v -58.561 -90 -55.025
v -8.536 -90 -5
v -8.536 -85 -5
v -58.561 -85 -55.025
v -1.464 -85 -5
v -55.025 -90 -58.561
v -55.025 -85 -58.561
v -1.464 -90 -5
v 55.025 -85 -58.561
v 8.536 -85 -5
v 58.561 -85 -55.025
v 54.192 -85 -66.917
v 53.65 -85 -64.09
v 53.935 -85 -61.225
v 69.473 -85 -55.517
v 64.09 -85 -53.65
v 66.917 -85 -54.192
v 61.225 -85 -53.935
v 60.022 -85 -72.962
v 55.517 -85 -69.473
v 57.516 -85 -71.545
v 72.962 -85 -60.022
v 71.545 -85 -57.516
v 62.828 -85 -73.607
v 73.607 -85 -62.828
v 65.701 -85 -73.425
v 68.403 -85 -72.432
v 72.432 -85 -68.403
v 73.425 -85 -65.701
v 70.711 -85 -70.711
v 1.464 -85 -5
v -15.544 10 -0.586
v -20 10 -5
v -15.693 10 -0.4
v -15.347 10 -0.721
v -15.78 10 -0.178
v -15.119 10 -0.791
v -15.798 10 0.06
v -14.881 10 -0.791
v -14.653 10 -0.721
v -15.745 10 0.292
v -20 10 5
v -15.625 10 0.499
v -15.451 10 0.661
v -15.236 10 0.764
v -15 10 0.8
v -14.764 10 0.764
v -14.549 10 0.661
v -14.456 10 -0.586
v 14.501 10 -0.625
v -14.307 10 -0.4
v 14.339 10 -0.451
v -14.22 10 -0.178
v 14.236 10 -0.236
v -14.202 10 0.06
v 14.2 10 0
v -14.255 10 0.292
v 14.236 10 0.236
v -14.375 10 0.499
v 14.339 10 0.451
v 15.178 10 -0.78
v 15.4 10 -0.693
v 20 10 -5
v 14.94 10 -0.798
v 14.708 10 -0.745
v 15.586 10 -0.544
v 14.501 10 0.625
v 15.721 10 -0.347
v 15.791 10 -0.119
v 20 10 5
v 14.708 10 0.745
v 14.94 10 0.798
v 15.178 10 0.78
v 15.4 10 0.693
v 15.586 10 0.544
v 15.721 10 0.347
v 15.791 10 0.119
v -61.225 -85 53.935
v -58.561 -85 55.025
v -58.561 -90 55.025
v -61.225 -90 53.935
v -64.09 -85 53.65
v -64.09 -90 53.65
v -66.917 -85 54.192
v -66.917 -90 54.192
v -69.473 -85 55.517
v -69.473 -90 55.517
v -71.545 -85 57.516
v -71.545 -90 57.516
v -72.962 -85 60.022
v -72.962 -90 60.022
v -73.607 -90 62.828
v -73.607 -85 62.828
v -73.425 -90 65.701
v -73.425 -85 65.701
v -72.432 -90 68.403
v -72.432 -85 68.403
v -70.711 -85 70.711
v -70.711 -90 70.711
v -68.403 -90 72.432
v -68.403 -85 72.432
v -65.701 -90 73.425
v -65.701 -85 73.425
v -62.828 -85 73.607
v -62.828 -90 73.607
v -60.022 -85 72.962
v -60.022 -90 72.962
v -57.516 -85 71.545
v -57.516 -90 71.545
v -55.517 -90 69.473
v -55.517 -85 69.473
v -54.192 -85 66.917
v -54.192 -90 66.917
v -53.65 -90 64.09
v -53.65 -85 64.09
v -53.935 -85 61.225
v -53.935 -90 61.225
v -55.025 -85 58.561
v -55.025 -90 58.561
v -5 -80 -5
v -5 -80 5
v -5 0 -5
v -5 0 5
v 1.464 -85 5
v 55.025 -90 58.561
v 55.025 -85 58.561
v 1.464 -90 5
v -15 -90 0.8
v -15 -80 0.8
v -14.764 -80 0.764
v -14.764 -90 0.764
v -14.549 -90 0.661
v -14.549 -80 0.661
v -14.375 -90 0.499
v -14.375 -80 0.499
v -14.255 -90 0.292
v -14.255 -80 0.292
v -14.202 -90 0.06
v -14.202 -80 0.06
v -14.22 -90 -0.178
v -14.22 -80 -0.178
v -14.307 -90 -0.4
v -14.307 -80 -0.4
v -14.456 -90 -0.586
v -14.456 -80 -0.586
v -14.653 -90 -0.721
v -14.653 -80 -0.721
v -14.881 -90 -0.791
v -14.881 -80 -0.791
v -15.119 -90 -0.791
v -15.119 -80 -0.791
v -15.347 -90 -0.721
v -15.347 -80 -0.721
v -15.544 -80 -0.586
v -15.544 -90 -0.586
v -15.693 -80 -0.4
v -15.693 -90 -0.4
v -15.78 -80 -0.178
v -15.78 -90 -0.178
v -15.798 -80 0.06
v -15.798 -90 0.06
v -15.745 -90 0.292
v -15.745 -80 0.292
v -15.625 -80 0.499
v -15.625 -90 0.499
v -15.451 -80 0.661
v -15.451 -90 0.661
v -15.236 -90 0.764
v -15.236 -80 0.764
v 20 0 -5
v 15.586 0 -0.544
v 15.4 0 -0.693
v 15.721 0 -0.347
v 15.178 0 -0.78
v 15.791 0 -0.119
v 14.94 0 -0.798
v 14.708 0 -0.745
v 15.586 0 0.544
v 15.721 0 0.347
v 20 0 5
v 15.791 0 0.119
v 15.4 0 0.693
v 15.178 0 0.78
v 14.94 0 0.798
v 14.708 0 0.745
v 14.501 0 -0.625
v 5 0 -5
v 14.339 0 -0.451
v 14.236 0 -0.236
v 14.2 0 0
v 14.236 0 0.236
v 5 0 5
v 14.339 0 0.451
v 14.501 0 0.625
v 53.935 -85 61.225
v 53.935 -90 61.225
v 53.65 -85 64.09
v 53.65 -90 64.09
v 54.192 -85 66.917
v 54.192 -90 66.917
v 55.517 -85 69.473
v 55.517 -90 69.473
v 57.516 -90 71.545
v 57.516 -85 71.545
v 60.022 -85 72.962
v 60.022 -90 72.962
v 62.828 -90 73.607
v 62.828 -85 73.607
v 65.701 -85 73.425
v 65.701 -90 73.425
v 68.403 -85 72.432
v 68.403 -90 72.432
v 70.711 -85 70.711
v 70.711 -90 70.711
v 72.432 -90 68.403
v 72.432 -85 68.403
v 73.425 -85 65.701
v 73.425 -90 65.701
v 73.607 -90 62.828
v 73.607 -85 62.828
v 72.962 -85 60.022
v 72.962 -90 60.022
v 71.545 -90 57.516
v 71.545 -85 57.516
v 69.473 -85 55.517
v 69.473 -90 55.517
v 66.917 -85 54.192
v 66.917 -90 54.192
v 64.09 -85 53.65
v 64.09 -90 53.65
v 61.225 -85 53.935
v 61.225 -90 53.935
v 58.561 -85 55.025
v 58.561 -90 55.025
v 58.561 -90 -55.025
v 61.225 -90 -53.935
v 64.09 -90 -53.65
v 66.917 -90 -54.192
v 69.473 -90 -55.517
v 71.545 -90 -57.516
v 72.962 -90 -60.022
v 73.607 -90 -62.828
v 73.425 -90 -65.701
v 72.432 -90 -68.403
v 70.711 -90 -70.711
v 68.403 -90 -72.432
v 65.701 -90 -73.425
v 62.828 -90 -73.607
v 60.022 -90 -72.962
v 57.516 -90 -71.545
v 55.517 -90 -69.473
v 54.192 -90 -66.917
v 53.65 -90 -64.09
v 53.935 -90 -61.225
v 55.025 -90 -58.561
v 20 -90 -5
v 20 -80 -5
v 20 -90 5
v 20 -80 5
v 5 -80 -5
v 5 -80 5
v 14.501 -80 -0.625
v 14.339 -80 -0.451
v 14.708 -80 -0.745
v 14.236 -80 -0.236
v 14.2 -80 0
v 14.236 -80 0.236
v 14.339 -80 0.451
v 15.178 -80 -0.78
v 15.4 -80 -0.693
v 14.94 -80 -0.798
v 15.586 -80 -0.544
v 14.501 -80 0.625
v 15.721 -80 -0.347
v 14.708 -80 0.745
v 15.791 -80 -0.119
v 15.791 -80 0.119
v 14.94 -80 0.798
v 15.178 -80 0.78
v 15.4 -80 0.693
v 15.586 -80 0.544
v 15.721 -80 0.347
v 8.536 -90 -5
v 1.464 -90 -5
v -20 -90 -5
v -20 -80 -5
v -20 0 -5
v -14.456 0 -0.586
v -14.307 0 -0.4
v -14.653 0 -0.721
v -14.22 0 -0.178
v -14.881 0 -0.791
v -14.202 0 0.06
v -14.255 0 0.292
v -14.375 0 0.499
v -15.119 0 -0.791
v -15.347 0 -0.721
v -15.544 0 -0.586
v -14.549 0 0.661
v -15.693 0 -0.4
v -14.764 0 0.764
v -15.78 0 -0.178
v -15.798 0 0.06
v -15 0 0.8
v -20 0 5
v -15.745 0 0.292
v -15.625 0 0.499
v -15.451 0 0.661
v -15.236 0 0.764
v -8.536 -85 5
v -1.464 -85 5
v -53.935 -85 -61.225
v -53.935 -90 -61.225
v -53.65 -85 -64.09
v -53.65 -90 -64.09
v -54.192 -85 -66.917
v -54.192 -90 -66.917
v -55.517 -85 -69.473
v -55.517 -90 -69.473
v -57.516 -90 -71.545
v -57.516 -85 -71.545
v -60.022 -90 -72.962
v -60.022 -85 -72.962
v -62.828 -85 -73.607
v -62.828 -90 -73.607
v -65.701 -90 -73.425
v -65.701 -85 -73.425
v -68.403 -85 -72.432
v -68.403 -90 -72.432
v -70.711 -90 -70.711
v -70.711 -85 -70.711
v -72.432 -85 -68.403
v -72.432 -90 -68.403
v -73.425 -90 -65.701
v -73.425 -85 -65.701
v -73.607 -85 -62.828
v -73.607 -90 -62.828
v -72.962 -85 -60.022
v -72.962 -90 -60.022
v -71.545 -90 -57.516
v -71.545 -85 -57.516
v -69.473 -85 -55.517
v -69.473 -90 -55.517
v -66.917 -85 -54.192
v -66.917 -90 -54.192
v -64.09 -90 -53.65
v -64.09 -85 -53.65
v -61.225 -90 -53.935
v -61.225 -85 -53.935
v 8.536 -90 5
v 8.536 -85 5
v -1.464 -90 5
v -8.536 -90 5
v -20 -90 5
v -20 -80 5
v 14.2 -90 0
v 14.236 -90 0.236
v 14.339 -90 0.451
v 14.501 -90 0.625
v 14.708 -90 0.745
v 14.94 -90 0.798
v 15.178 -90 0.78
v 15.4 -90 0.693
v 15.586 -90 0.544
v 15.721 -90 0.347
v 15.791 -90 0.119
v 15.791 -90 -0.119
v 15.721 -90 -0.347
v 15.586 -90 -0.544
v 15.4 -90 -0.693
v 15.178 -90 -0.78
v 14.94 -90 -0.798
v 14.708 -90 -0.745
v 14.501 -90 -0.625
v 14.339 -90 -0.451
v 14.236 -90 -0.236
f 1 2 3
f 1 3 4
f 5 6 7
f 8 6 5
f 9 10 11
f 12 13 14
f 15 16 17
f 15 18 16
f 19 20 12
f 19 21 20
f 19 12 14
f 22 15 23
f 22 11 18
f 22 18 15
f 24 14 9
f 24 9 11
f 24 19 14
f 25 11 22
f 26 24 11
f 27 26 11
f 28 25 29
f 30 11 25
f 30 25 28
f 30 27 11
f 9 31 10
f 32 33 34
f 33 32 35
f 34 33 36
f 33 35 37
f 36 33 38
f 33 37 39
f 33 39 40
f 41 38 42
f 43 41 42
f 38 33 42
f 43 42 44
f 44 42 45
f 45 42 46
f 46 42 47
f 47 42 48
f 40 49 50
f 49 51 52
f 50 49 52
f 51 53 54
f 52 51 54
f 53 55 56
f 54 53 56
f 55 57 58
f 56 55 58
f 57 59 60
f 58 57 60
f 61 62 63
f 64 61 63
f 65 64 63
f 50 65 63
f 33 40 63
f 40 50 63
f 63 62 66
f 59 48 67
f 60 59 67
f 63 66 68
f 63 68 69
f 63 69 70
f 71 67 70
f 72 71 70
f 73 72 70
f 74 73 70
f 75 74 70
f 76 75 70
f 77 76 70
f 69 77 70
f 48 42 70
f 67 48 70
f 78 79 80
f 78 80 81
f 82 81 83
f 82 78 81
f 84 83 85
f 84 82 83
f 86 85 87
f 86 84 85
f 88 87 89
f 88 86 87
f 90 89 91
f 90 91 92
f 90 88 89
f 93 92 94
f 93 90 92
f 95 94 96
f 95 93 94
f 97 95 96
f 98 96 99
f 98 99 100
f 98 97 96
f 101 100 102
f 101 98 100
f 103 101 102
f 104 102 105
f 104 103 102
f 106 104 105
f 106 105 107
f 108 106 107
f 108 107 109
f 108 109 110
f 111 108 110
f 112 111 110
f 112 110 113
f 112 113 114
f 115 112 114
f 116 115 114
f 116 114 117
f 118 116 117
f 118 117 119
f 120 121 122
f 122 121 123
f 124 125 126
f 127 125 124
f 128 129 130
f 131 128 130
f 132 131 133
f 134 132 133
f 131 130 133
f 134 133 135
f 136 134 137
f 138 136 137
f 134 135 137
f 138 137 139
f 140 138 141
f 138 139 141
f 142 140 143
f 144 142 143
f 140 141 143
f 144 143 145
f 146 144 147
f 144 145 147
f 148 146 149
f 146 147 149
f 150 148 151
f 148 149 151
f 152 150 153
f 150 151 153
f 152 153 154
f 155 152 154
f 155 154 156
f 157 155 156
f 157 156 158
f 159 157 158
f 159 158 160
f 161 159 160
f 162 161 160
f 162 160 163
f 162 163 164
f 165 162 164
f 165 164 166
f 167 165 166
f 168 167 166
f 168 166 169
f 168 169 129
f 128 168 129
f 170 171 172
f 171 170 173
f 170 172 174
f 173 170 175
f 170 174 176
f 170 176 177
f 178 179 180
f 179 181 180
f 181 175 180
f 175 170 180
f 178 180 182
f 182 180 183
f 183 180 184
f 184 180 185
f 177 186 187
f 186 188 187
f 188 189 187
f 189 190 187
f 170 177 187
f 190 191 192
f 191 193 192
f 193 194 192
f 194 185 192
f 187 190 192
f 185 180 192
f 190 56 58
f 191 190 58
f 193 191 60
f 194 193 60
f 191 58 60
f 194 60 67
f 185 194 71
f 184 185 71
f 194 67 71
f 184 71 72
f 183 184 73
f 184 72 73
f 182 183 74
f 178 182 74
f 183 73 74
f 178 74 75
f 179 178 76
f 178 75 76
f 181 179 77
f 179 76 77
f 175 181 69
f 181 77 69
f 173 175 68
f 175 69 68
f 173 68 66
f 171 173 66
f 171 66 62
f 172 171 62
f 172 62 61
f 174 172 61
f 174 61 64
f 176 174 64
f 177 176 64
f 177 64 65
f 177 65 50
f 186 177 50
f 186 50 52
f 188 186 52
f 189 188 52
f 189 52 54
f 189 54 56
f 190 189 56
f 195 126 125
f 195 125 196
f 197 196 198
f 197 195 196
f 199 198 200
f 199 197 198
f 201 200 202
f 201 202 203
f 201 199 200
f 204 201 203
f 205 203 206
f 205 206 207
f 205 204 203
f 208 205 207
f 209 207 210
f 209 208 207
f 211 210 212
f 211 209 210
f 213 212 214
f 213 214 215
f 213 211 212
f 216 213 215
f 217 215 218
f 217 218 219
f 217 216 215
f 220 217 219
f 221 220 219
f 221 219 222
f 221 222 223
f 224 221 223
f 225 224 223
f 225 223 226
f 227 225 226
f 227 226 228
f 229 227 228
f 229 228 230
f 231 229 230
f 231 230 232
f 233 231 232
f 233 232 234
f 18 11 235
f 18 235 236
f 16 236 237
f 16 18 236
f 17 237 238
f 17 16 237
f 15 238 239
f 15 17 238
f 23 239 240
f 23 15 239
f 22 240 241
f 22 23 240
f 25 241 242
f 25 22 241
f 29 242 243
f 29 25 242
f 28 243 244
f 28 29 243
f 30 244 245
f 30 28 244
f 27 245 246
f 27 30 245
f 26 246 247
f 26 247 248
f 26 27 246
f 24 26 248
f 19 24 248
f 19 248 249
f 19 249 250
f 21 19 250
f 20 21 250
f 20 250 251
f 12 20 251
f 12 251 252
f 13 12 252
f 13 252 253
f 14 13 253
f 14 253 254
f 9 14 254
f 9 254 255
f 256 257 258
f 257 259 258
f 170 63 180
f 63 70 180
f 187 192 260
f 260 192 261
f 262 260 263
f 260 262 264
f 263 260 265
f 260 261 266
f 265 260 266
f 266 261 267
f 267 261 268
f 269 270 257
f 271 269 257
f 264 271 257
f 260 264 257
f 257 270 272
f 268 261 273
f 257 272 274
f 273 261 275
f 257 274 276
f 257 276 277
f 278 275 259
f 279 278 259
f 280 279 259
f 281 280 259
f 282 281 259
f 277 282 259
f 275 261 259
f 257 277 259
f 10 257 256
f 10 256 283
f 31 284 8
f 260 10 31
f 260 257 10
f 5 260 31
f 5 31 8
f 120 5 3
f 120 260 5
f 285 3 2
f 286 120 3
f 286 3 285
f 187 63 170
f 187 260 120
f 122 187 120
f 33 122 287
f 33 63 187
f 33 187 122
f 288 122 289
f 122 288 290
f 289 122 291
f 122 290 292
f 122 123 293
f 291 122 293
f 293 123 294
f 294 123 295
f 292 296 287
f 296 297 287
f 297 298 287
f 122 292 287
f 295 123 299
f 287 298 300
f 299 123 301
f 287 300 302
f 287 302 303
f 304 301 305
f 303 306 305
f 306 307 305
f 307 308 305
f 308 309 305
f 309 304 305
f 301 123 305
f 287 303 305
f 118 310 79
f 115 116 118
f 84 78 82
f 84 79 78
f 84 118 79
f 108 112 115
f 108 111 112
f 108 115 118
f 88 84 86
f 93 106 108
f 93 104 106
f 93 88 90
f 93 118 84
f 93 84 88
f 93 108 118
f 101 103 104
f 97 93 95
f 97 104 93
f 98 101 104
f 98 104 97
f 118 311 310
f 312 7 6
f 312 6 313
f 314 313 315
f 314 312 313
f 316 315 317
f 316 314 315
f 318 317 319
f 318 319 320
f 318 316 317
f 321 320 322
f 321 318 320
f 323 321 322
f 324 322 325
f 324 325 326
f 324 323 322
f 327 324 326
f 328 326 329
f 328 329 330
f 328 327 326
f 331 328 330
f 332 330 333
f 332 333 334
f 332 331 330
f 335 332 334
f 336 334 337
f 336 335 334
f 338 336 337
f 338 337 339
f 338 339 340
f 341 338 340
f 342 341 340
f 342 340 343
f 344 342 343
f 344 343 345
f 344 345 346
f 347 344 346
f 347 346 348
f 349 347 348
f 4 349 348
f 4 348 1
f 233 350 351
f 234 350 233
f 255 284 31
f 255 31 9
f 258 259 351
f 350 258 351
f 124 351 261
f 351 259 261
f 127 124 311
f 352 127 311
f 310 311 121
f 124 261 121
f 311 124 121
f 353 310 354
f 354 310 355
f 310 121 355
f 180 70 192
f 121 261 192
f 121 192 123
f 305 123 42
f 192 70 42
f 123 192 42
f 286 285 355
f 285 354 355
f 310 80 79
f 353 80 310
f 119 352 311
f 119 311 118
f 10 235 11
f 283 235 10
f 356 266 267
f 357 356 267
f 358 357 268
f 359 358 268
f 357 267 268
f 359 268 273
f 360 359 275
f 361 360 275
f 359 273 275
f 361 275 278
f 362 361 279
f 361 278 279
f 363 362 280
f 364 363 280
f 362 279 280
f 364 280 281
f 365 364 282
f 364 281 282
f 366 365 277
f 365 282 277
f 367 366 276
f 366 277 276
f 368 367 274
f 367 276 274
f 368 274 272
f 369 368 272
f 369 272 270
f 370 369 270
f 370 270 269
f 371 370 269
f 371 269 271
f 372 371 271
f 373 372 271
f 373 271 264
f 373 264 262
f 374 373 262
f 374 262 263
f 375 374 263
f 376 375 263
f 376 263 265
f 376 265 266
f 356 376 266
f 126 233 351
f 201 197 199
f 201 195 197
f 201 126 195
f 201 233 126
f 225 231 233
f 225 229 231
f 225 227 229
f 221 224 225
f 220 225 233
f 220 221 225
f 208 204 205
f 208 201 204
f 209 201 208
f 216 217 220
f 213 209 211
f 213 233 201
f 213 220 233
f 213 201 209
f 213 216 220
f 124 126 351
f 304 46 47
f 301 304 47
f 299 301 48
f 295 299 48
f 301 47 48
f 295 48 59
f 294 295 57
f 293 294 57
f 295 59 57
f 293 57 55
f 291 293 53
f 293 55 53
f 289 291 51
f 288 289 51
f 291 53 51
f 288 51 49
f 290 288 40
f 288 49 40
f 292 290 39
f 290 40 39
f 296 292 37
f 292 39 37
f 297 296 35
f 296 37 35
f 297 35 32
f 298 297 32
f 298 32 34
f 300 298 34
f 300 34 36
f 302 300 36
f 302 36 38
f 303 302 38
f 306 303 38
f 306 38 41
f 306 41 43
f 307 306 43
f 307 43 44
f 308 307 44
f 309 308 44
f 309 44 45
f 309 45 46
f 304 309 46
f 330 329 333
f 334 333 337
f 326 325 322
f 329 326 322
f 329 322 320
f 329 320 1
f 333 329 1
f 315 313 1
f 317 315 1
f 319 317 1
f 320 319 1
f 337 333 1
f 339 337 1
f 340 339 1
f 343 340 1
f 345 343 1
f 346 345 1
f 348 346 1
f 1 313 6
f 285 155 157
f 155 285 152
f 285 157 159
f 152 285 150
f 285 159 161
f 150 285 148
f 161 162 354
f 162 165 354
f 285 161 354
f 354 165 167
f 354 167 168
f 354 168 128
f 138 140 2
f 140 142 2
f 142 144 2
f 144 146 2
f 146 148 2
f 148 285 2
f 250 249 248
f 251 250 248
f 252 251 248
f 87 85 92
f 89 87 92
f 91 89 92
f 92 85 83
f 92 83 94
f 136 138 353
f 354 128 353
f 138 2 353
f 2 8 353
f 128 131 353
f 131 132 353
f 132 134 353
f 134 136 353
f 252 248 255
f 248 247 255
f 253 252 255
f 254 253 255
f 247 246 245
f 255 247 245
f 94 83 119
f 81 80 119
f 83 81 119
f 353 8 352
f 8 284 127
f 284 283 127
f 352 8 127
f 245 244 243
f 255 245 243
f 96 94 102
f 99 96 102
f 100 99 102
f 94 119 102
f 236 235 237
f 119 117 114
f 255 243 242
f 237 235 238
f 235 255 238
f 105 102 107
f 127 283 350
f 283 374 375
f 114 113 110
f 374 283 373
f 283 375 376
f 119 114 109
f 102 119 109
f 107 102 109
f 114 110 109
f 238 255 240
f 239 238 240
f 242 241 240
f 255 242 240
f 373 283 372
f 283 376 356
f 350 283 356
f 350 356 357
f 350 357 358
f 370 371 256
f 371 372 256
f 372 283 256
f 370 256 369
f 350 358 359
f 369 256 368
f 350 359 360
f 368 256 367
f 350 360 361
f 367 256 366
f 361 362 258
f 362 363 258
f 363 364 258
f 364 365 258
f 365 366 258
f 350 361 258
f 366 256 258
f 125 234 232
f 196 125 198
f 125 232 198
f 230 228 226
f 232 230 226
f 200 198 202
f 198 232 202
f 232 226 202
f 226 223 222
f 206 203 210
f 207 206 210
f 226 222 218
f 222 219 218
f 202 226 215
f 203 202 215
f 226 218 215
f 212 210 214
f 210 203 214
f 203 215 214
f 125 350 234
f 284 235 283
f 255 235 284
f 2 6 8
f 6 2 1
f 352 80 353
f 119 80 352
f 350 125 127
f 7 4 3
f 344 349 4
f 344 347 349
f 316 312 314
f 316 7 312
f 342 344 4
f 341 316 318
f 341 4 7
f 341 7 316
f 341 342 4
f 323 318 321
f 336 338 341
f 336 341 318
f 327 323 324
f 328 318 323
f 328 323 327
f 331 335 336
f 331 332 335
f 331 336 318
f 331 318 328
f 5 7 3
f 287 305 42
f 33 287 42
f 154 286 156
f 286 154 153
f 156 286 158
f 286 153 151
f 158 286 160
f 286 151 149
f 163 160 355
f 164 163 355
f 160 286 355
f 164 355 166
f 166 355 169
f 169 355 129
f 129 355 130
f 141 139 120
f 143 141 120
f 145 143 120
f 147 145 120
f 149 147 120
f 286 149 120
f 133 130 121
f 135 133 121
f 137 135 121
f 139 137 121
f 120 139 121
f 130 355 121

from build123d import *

# Parameters (mm, degrees)
EXTRUDE_1_DEPTH          = 5
EXTRUDE_2_DEPTH          = 5
PATTERN_CIRCULAR_1_COUNT = 4
SKETCH_3_R               = 10
EXTRUDE_3_DEPTH          = 5
PATTERN_CIRCULAR_2_COUNT = 4
SKETCH_4_R               = 0.8
CUT_EXTRUDE_1_DEPTH      = 219


with BuildPart() as part:
    # 草图1 → 凸台-拉伸1 (new, symmetric)
    with BuildSketch(Plane.XY):
        Polygon((-20, 10), (20, 10), (20, 0), (5, 0), (5, -80), (20, -80), (20, -90), (-20, -90), (-20, -80), (-5, -80), (-5, 0), (-20, 0), align=None)
    extrude(amount=EXTRUDE_1_DEPTH, both=True)

    # 草图2 → 凸台-拉伸2 (add)
    with BuildSketch(Plane.XZ.offset(90)):
        Polygon((65.40737726, 61.871843354), (61.871843354, 65.40737726), (-1.767766953, 1.767766953), (1.767766953, -1.767766953), align=None)
    extrude_2 = extrude(amount=-EXTRUDE_2_DEPTH)

    # 阵列(圆周)1: 凸台-拉伸2 ×4 about axis
    pattern_circular_1_axis = Axis((0, 0, 0), (0, 1, 0))
    for i in range(1, PATTERN_CIRCULAR_1_COUNT):
        add(extrude_2.rotate(pattern_circular_1_axis, i * 360 / PATTERN_CIRCULAR_1_COUNT))

    # 草图3 → 凸台-拉伸3 (add)
    with BuildSketch(Plane(origin=(0, -85, 0), x_dir=(1, 0, 0), z_dir=(0, 1, 0))):
        with Locations((63.639610307, 63.639610307)):
            Circle(SKETCH_3_R)
    extrude_3 = extrude(amount=-EXTRUDE_3_DEPTH)

    # 阵列(圆周)2: 凸台-拉伸3 ×4 about axis
    pattern_circular_2_axis = Axis((0, 0, 0), (0, 1, 0))
    for i in range(1, PATTERN_CIRCULAR_2_COUNT):
        add(extrude_3.rotate(pattern_circular_2_axis, i * 360 / PATTERN_CIRCULAR_2_COUNT))

    # 草图4 → 切除-拉伸1 (cut)
    with BuildSketch(Plane(origin=(0, 10, 0), x_dir=(1, 0, 0), z_dir=(0, 1, 0))):
        with Locations(Location((15, 0, 0), (0, 0, 180))):
            Circle(SKETCH_4_R)
        with Locations(Location((-15, 0, 0), (0, 0, 270))):
            Circle(SKETCH_4_R)
    extrude(amount=-CUT_EXTRUDE_1_DEPTH, mode=Mode.SUBTRACT)


solid = part.part
